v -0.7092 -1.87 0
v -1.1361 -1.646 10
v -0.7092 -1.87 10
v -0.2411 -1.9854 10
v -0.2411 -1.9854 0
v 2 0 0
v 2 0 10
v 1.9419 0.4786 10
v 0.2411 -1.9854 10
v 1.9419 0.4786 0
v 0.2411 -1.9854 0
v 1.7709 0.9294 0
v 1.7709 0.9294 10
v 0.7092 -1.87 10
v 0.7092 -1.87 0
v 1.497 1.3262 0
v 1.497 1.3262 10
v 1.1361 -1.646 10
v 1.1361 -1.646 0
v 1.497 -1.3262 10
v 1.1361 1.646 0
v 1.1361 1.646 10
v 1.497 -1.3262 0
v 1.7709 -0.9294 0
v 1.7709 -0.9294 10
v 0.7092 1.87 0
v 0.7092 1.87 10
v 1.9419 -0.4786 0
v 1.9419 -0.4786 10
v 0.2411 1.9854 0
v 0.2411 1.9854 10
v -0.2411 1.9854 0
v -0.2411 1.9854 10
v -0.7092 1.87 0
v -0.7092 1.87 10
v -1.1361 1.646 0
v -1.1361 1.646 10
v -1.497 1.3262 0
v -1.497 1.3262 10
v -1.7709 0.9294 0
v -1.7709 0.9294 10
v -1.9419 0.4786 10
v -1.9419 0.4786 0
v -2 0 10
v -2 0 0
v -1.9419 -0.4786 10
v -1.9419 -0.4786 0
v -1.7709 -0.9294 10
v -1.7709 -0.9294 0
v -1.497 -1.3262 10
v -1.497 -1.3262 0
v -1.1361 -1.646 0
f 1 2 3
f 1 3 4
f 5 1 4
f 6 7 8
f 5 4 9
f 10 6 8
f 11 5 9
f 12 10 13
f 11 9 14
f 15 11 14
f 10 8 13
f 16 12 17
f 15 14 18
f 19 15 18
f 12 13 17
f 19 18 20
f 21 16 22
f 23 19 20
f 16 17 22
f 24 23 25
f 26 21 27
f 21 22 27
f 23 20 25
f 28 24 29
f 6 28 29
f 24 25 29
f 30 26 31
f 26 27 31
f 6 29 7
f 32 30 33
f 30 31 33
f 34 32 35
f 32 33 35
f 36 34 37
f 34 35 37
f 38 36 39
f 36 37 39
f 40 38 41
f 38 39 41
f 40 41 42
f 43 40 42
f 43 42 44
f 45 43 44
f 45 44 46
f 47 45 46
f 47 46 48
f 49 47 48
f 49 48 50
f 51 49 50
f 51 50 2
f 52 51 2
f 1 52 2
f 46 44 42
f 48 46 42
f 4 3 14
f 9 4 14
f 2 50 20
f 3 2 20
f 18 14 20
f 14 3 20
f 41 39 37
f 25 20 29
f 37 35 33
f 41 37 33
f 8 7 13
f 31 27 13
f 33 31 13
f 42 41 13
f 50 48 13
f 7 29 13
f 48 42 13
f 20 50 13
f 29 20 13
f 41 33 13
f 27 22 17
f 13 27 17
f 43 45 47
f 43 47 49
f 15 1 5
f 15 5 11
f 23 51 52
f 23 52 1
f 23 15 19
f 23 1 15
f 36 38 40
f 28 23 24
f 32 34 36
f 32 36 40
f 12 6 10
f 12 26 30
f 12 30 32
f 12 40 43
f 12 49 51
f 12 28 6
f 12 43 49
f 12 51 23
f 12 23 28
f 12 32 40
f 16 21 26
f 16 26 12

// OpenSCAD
face_1_points = [
  [-0.70921,-1.87003,10],[-1.13613,-1.64597,10],[-0.70921,-1.87003,0], // Triangle 1 / 52
  [-0.241073,-1.98542,10],[-0.70921,-1.87003,10],[-0.70921,-1.87003,0],
  [-0.241073,-1.98542,10],[-0.70921,-1.87003,0],[-0.241073,-1.98542,0],
  [1.94188,0.478631,10],[2,-4.89859e-16,10],[2,-4.89859e-16,0],
  [0.241073,-1.98542,10],[-0.241073,-1.98542,10],[-0.241073,-1.98542,0],
  [1.94188,0.478631,10],[2,-4.89859e-16,0],[1.94188,0.478631,0],
  [0.241073,-1.98542,10],[-0.241073,-1.98542,0],[0.241073,-1.98542,0],
  [1.77091,0.929446,10],[1.94188,0.478631,0],[1.77091,0.929446,0],
  [0.70921,-1.87003,10],[0.241073,-1.98542,10],[0.241073,-1.98542,0],
  [0.70921,-1.87003,10],[0.241073,-1.98542,0],[0.70921,-1.87003,0], // Triangle 10 / 52
  [1.77091,0.929446,10],[1.94188,0.478631,10],[1.94188,0.478631,0],
  [1.49702,1.32625,10],[1.77091,0.929446,0],[1.49702,1.32625,0],
  [1.13613,-1.64597,10],[0.70921,-1.87003,10],[0.70921,-1.87003,0],
  [1.13613,-1.64597,10],[0.70921,-1.87003,0],[1.13613,-1.64597,0],
  [1.49702,1.32625,10],[1.77091,0.929446,10],[1.77091,0.929446,0],
  [1.49702,-1.32625,10],[1.13613,-1.64597,10],[1.13613,-1.64597,0],
  [1.13613,1.64597,10],[1.49702,1.32625,0],[1.13613,1.64597,0],
  [1.49702,-1.32625,10],[1.13613,-1.64597,0],[1.49702,-1.32625,0],
  [1.13613,1.64597,10],[1.49702,1.32625,10],[1.49702,1.32625,0],
  [1.77091,-0.929446,10],[1.49702,-1.32625,0],[1.77091,-0.929446,0], // Triangle 20 / 52
  [0.70921,1.87003,10],[1.13613,1.64597,0],[0.70921,1.87003,0],
  [0.70921,1.87003,10],[1.13613,1.64597,10],[1.13613,1.64597,0],
  [1.77091,-0.929446,10],[1.49702,-1.32625,10],[1.49702,-1.32625,0],
  [1.94188,-0.478631,10],[1.77091,-0.929446,0],[1.94188,-0.478631,0],
  [1.94188,-0.478631,10],[1.94188,-0.478631,0],[2,-4.89859e-16,0],
  [1.94188,-0.478631,10],[1.77091,-0.929446,10],[1.77091,-0.929446,0],
  [0.241073,1.98542,10],[0.70921,1.87003,0],[0.241073,1.98542,0],
  [0.241073,1.98542,10],[0.70921,1.87003,10],[0.70921,1.87003,0],
  [2,-4.89859e-16,10],[1.94188,-0.478631,10],[2,-4.89859e-16,0],
  [-0.241073,1.98542,10],[0.241073,1.98542,0],[-0.241073,1.98542,0], // Triangle 30 / 52
  [-0.241073,1.98542,10],[0.241073,1.98542,10],[0.241073,1.98542,0],
  [-0.70921,1.87003,10],[-0.241073,1.98542,0],[-0.70921,1.87003,0],
  [-0.70921,1.87003,10],[-0.241073,1.98542,10],[-0.241073,1.98542,0],
  [-1.13613,1.64597,10],[-0.70921,1.87003,0],[-1.13613,1.64597,0],
  [-1.13613,1.64597,10],[-0.70921,1.87003,10],[-0.70921,1.87003,0],
  [-1.49702,1.32625,10],[-1.13613,1.64597,0],[-1.49702,1.32625,0],
  [-1.49702,1.32625,10],[-1.13613,1.64597,10],[-1.13613,1.64597,0],
  [-1.77091,0.929446,10],[-1.49702,1.32625,0],[-1.77091,0.929446,0],
  [-1.77091,0.929446,10],[-1.49702,1.32625,10],[-1.49702,1.32625,0],
  [-1.94188,0.478631,10],[-1.77091,0.929446,10],[-1.77091,0.929446,0], // Triangle 40 / 52
  [-1.94188,0.478631,10],[-1.77091,0.929446,0],[-1.94188,0.478631,0],
  [-2,2.02129e-15,10],[-1.94188,0.478631,10],[-1.94188,0.478631,0],
  [-2,2.02129e-15,10],[-1.94188,0.478631,0],[-2,2.02129e-15,0],
  [-1.94188,-0.478631,10],[-2,2.02129e-15,10],[-2,2.02129e-15,0],
  [-1.94188,-0.478631,10],[-2,2.02129e-15,0],[-1.94188,-0.478631,0],
  [-1.77091,-0.929446,10],[-1.94188,-0.478631,10],[-1.94188,-0.478631,0],
  [-1.77091,-0.929446,10],[-1.94188,-0.478631,0],[-1.77091,-0.929446,0],
  [-1.49702,-1.32625,10],[-1.77091,-0.929446,10],[-1.77091,-0.929446,0],
  [-1.49702,-1.32625,10],[-1.77091,-0.929446,0],[-1.49702,-1.32625,0],
  [-1.13613,-1.64597,10],[-1.49702,-1.32625,10],[-1.49702,-1.32625,0], // Triangle 50 / 52
  [-1.13613,-1.64597,10],[-1.49702,-1.32625,0],[-1.13613,-1.64597,0],
  [-1.13613,-1.64597,10],[-1.13613,-1.64597,0],[-0.70921,-1.87003,0],
];
face_1_faces = [
  [0,1,2], // Triangle 1 / 52
  [3,4,5],
  [6,7,8],
  [9,10,11],
  [12,13,14],
  [15,16,17],
  [18,19,20],
  [21,22,23],
  [24,25,26],
  [27,28,29], // Triangle 10 / 52
  [30,31,32],
  [33,34,35],
  [36,37,38],
  [39,40,41],
  [42,43,44],
  [45,46,47],
  [48,49,50],
  [51,52,53],
  [54,55,56],
  [57,58,59], // Triangle 20 / 52
  [60,61,62],
  [63,64,65],
  [66,67,68],
  [69,70,71],
  [72,73,74],
  [75,76,77],
  [78,79,80],
  [81,82,83],
  [84,85,86],
  [87,88,89], // Triangle 30 / 52
  [90,91,92],
  [93,94,95],
  [96,97,98],
  [99,100,101],
  [102,103,104],
  [105,106,107],
  [108,109,110],
  [111,112,113],
  [114,115,116],
  [117,118,119], // Triangle 40 / 52
  [120,121,122],
  [123,124,125],
  [126,127,128],
  [129,130,131],
  [132,133,134],
  [135,136,137],
  [138,139,140],
  [141,142,143],
  [144,145,146],
  [147,148,149], // Triangle 50 / 52
  [150,151,152],
  [153,154,155],
];

face_2_points = [
  [-1.94188,0.478631,10],[-2,2.02129e-15,10],[-1.94188,-0.478631,10], // Triangle 1 / 24
  [-1.94188,0.478631,10],[-1.94188,-0.478631,10],[-1.77091,-0.929446,10],
  [0.70921,-1.87003,10],[-0.70921,-1.87003,10],[-0.241073,-1.98542,10],
  [0.70921,-1.87003,10],[-0.241073,-1.98542,10],[0.241073,-1.98542,10],
  [1.49702,-1.32625,10],[-1.49702,-1.32625,10],[-1.13613,-1.64597,10],
  [1.49702,-1.32625,10],[-1.13613,-1.64597,10],[-0.70921,-1.87003,10],
  [1.49702,-1.32625,10],[0.70921,-1.87003,10],[1.13613,-1.64597,10],
  [1.49702,-1.32625,10],[-0.70921,-1.87003,10],[0.70921,-1.87003,10],
  [-1.13613,1.64597,10],[-1.49702,1.32625,10],[-1.77091,0.929446,10],
  [1.94188,-0.478631,10],[1.49702,-1.32625,10],[1.77091,-0.929446,10], // Triangle 10 / 24
  [-0.241073,1.98542,10],[-0.70921,1.87003,10],[-1.13613,1.64597,10],
  [-0.241073,1.98542,10],[-1.13613,1.64597,10],[-1.77091,0.929446,10],
  [1.77091,0.929446,10],[2,-4.89859e-16,10],[1.94188,0.478631,10],
  [1.77091,0.929446,10],[0.70921,1.87003,10],[0.241073,1.98542,10],
  [1.77091,0.929446,10],[0.241073,1.98542,10],[-0.241073,1.98542,10],
  [1.77091,0.929446,10],[-1.77091,0.929446,10],[-1.94188,0.478631,10],
  [1.77091,0.929446,10],[-1.77091,-0.929446,10],[-1.49702,-1.32625,10],
  [1.77091,0.929446,10],[1.94188,-0.478631,10],[2,-4.89859e-16,10],
  [1.77091,0.929446,10],[-1.94188,0.478631,10],[-1.77091,-0.929446,10],
  [1.77091,0.929446,10],[-1.49702,-1.32625,10],[1.49702,-1.32625,10], // Triangle 20 / 24
  [1.77091,0.929446,10],[1.49702,-1.32625,10],[1.94188,-0.478631,10],
  [1.77091,0.929446,10],[-0.241073,1.98542,10],[-1.77091,0.929446,10],
  [1.49702,1.32625,10],[1.13613,1.64597,10],[0.70921,1.87003,10],
  [1.49702,1.32625,10],[0.70921,1.87003,10],[1.77091,0.929446,10],
];
face_2_faces = [
  [0,1,2], // Triangle 1 / 24
  [3,4,5],
  [6,7,8],
  [9,10,11],
  [12,13,14],
  [15,16,17],
  [18,19,20],
  [21,22,23],
  [24,25,26],
  [27,28,29], // Triangle 10 / 24
  [30,31,32],
  [33,34,35],
  [36,37,38],
  [39,40,41],
  [42,43,44],
  [45,46,47],
  [48,49,50],
  [51,52,53],
  [54,55,56],
  [57,58,59], // Triangle 20 / 24
  [60,61,62],
  [63,64,65],
  [66,67,68],
  [69,70,71],
];

face_3_points = [
  [-1.94188,-0.478631,0],[-2,2.02129e-15,0],[-1.94188,0.478631,0], // Triangle 1 / 24
  [-1.77091,-0.929446,0],[-1.94188,-0.478631,0],[-1.94188,0.478631,0],
  [-0.241073,-1.98542,0],[-0.70921,-1.87003,0],[0.70921,-1.87003,0],
  [0.241073,-1.98542,0],[-0.241073,-1.98542,0],[0.70921,-1.87003,0],
  [-1.13613,-1.64597,0],[-1.49702,-1.32625,0],[1.49702,-1.32625,0],
  [-0.70921,-1.87003,0],[-1.13613,-1.64597,0],[1.49702,-1.32625,0],
  [1.13613,-1.64597,0],[0.70921,-1.87003,0],[1.49702,-1.32625,0],
  [0.70921,-1.87003,0],[-0.70921,-1.87003,0],[1.49702,-1.32625,0],
  [-1.77091,0.929446,0],[-1.49702,1.32625,0],[-1.13613,1.64597,0],
  [1.77091,-0.929446,0],[1.49702,-1.32625,0],[1.94188,-0.478631,0], // Triangle 10 / 24
  [-1.13613,1.64597,0],[-0.70921,1.87003,0],[-0.241073,1.98542,0],
  [-1.77091,0.929446,0],[-1.13613,1.64597,0],[-0.241073,1.98542,0],
  [1.94188,0.478631,0],[2,-4.89859e-16,0],[1.77091,0.929446,0],
  [0.241073,1.98542,0],[0.70921,1.87003,0],[1.77091,0.929446,0],
  [-0.241073,1.98542,0],[0.241073,1.98542,0],[1.77091,0.929446,0],
  [-1.94188,0.478631,0],[-1.77091,0.929446,0],[1.77091,0.929446,0],
  [-1.49702,-1.32625,0],[-1.77091,-0.929446,0],[1.77091,0.929446,0],
  [2,-4.89859e-16,0],[1.94188,-0.478631,0],[1.77091,0.929446,0],
  [-1.77091,-0.929446,0],[-1.94188,0.478631,0],[1.77091,0.929446,0],
  [1.49702,-1.32625,0],[-1.49702,-1.32625,0],[1.77091,0.929446,0], // Triangle 20 / 24
  [1.94188,-0.478631,0],[1.49702,-1.32625,0],[1.77091,0.929446,0],
  [-1.77091,0.929446,0],[-0.241073,1.98542,0],[1.77091,0.929446,0],
  [0.70921,1.87003,0],[1.13613,1.64597,0],[1.49702,1.32625,0],
  [1.77091,0.929446,0],[0.70921,1.87003,0],[1.49702,1.32625,0],
];
face_3_faces = [
  [0,1,2], // Triangle 1 / 24
  [3,4,5],
  [6,7,8],
  [9,10,11],
  [12,13,14],
  [15,16,17],
  [18,19,20],
  [21,22,23],
  [24,25,26],
  [27,28,29], // Triangle 10 / 24
  [30,31,32],
  [33,34,35],
  [36,37,38],
  [39,40,41],
  [42,43,44],
  [45,46,47],
  [48,49,50],
  [51,52,53],
  [54,55,56],
  [57,58,59], // Triangle 20 / 24
  [60,61,62],
  [63,64,65],
  [66,67,68],
  [69,70,71],
];

module crazy_colors() {
color("Violet")
polyhedron(face_1_points, face_1_faces);
color("red")
polyhedron(face_2_points, face_2_faces);
color("blue")
polyhedron(face_3_points, face_3_faces);
}
function add_offset(vec,ofs) = [for (x=vec) x + [ofs,ofs,ofs]];
module solid_object() {
  tmp1_points = face_1_points;
  tmp1_faces =  face_1_faces;

  tmp2_points = concat(tmp1_points, face_2_points);
  tmp2_faces =  concat(tmp1_faces,add_offset(face_2_faces,len(tmp1_points)));

  tmp3_points = concat(tmp2_points, face_3_points);
  tmp3_faces =  concat(tmp2_faces,add_offset(face_3_faces,len(tmp2_points)));

  polyhedron (tmp3_points, tmp3_faces);
}


if ($preview) {;
  crazy_colors();
} else {
  solid_object();
}
